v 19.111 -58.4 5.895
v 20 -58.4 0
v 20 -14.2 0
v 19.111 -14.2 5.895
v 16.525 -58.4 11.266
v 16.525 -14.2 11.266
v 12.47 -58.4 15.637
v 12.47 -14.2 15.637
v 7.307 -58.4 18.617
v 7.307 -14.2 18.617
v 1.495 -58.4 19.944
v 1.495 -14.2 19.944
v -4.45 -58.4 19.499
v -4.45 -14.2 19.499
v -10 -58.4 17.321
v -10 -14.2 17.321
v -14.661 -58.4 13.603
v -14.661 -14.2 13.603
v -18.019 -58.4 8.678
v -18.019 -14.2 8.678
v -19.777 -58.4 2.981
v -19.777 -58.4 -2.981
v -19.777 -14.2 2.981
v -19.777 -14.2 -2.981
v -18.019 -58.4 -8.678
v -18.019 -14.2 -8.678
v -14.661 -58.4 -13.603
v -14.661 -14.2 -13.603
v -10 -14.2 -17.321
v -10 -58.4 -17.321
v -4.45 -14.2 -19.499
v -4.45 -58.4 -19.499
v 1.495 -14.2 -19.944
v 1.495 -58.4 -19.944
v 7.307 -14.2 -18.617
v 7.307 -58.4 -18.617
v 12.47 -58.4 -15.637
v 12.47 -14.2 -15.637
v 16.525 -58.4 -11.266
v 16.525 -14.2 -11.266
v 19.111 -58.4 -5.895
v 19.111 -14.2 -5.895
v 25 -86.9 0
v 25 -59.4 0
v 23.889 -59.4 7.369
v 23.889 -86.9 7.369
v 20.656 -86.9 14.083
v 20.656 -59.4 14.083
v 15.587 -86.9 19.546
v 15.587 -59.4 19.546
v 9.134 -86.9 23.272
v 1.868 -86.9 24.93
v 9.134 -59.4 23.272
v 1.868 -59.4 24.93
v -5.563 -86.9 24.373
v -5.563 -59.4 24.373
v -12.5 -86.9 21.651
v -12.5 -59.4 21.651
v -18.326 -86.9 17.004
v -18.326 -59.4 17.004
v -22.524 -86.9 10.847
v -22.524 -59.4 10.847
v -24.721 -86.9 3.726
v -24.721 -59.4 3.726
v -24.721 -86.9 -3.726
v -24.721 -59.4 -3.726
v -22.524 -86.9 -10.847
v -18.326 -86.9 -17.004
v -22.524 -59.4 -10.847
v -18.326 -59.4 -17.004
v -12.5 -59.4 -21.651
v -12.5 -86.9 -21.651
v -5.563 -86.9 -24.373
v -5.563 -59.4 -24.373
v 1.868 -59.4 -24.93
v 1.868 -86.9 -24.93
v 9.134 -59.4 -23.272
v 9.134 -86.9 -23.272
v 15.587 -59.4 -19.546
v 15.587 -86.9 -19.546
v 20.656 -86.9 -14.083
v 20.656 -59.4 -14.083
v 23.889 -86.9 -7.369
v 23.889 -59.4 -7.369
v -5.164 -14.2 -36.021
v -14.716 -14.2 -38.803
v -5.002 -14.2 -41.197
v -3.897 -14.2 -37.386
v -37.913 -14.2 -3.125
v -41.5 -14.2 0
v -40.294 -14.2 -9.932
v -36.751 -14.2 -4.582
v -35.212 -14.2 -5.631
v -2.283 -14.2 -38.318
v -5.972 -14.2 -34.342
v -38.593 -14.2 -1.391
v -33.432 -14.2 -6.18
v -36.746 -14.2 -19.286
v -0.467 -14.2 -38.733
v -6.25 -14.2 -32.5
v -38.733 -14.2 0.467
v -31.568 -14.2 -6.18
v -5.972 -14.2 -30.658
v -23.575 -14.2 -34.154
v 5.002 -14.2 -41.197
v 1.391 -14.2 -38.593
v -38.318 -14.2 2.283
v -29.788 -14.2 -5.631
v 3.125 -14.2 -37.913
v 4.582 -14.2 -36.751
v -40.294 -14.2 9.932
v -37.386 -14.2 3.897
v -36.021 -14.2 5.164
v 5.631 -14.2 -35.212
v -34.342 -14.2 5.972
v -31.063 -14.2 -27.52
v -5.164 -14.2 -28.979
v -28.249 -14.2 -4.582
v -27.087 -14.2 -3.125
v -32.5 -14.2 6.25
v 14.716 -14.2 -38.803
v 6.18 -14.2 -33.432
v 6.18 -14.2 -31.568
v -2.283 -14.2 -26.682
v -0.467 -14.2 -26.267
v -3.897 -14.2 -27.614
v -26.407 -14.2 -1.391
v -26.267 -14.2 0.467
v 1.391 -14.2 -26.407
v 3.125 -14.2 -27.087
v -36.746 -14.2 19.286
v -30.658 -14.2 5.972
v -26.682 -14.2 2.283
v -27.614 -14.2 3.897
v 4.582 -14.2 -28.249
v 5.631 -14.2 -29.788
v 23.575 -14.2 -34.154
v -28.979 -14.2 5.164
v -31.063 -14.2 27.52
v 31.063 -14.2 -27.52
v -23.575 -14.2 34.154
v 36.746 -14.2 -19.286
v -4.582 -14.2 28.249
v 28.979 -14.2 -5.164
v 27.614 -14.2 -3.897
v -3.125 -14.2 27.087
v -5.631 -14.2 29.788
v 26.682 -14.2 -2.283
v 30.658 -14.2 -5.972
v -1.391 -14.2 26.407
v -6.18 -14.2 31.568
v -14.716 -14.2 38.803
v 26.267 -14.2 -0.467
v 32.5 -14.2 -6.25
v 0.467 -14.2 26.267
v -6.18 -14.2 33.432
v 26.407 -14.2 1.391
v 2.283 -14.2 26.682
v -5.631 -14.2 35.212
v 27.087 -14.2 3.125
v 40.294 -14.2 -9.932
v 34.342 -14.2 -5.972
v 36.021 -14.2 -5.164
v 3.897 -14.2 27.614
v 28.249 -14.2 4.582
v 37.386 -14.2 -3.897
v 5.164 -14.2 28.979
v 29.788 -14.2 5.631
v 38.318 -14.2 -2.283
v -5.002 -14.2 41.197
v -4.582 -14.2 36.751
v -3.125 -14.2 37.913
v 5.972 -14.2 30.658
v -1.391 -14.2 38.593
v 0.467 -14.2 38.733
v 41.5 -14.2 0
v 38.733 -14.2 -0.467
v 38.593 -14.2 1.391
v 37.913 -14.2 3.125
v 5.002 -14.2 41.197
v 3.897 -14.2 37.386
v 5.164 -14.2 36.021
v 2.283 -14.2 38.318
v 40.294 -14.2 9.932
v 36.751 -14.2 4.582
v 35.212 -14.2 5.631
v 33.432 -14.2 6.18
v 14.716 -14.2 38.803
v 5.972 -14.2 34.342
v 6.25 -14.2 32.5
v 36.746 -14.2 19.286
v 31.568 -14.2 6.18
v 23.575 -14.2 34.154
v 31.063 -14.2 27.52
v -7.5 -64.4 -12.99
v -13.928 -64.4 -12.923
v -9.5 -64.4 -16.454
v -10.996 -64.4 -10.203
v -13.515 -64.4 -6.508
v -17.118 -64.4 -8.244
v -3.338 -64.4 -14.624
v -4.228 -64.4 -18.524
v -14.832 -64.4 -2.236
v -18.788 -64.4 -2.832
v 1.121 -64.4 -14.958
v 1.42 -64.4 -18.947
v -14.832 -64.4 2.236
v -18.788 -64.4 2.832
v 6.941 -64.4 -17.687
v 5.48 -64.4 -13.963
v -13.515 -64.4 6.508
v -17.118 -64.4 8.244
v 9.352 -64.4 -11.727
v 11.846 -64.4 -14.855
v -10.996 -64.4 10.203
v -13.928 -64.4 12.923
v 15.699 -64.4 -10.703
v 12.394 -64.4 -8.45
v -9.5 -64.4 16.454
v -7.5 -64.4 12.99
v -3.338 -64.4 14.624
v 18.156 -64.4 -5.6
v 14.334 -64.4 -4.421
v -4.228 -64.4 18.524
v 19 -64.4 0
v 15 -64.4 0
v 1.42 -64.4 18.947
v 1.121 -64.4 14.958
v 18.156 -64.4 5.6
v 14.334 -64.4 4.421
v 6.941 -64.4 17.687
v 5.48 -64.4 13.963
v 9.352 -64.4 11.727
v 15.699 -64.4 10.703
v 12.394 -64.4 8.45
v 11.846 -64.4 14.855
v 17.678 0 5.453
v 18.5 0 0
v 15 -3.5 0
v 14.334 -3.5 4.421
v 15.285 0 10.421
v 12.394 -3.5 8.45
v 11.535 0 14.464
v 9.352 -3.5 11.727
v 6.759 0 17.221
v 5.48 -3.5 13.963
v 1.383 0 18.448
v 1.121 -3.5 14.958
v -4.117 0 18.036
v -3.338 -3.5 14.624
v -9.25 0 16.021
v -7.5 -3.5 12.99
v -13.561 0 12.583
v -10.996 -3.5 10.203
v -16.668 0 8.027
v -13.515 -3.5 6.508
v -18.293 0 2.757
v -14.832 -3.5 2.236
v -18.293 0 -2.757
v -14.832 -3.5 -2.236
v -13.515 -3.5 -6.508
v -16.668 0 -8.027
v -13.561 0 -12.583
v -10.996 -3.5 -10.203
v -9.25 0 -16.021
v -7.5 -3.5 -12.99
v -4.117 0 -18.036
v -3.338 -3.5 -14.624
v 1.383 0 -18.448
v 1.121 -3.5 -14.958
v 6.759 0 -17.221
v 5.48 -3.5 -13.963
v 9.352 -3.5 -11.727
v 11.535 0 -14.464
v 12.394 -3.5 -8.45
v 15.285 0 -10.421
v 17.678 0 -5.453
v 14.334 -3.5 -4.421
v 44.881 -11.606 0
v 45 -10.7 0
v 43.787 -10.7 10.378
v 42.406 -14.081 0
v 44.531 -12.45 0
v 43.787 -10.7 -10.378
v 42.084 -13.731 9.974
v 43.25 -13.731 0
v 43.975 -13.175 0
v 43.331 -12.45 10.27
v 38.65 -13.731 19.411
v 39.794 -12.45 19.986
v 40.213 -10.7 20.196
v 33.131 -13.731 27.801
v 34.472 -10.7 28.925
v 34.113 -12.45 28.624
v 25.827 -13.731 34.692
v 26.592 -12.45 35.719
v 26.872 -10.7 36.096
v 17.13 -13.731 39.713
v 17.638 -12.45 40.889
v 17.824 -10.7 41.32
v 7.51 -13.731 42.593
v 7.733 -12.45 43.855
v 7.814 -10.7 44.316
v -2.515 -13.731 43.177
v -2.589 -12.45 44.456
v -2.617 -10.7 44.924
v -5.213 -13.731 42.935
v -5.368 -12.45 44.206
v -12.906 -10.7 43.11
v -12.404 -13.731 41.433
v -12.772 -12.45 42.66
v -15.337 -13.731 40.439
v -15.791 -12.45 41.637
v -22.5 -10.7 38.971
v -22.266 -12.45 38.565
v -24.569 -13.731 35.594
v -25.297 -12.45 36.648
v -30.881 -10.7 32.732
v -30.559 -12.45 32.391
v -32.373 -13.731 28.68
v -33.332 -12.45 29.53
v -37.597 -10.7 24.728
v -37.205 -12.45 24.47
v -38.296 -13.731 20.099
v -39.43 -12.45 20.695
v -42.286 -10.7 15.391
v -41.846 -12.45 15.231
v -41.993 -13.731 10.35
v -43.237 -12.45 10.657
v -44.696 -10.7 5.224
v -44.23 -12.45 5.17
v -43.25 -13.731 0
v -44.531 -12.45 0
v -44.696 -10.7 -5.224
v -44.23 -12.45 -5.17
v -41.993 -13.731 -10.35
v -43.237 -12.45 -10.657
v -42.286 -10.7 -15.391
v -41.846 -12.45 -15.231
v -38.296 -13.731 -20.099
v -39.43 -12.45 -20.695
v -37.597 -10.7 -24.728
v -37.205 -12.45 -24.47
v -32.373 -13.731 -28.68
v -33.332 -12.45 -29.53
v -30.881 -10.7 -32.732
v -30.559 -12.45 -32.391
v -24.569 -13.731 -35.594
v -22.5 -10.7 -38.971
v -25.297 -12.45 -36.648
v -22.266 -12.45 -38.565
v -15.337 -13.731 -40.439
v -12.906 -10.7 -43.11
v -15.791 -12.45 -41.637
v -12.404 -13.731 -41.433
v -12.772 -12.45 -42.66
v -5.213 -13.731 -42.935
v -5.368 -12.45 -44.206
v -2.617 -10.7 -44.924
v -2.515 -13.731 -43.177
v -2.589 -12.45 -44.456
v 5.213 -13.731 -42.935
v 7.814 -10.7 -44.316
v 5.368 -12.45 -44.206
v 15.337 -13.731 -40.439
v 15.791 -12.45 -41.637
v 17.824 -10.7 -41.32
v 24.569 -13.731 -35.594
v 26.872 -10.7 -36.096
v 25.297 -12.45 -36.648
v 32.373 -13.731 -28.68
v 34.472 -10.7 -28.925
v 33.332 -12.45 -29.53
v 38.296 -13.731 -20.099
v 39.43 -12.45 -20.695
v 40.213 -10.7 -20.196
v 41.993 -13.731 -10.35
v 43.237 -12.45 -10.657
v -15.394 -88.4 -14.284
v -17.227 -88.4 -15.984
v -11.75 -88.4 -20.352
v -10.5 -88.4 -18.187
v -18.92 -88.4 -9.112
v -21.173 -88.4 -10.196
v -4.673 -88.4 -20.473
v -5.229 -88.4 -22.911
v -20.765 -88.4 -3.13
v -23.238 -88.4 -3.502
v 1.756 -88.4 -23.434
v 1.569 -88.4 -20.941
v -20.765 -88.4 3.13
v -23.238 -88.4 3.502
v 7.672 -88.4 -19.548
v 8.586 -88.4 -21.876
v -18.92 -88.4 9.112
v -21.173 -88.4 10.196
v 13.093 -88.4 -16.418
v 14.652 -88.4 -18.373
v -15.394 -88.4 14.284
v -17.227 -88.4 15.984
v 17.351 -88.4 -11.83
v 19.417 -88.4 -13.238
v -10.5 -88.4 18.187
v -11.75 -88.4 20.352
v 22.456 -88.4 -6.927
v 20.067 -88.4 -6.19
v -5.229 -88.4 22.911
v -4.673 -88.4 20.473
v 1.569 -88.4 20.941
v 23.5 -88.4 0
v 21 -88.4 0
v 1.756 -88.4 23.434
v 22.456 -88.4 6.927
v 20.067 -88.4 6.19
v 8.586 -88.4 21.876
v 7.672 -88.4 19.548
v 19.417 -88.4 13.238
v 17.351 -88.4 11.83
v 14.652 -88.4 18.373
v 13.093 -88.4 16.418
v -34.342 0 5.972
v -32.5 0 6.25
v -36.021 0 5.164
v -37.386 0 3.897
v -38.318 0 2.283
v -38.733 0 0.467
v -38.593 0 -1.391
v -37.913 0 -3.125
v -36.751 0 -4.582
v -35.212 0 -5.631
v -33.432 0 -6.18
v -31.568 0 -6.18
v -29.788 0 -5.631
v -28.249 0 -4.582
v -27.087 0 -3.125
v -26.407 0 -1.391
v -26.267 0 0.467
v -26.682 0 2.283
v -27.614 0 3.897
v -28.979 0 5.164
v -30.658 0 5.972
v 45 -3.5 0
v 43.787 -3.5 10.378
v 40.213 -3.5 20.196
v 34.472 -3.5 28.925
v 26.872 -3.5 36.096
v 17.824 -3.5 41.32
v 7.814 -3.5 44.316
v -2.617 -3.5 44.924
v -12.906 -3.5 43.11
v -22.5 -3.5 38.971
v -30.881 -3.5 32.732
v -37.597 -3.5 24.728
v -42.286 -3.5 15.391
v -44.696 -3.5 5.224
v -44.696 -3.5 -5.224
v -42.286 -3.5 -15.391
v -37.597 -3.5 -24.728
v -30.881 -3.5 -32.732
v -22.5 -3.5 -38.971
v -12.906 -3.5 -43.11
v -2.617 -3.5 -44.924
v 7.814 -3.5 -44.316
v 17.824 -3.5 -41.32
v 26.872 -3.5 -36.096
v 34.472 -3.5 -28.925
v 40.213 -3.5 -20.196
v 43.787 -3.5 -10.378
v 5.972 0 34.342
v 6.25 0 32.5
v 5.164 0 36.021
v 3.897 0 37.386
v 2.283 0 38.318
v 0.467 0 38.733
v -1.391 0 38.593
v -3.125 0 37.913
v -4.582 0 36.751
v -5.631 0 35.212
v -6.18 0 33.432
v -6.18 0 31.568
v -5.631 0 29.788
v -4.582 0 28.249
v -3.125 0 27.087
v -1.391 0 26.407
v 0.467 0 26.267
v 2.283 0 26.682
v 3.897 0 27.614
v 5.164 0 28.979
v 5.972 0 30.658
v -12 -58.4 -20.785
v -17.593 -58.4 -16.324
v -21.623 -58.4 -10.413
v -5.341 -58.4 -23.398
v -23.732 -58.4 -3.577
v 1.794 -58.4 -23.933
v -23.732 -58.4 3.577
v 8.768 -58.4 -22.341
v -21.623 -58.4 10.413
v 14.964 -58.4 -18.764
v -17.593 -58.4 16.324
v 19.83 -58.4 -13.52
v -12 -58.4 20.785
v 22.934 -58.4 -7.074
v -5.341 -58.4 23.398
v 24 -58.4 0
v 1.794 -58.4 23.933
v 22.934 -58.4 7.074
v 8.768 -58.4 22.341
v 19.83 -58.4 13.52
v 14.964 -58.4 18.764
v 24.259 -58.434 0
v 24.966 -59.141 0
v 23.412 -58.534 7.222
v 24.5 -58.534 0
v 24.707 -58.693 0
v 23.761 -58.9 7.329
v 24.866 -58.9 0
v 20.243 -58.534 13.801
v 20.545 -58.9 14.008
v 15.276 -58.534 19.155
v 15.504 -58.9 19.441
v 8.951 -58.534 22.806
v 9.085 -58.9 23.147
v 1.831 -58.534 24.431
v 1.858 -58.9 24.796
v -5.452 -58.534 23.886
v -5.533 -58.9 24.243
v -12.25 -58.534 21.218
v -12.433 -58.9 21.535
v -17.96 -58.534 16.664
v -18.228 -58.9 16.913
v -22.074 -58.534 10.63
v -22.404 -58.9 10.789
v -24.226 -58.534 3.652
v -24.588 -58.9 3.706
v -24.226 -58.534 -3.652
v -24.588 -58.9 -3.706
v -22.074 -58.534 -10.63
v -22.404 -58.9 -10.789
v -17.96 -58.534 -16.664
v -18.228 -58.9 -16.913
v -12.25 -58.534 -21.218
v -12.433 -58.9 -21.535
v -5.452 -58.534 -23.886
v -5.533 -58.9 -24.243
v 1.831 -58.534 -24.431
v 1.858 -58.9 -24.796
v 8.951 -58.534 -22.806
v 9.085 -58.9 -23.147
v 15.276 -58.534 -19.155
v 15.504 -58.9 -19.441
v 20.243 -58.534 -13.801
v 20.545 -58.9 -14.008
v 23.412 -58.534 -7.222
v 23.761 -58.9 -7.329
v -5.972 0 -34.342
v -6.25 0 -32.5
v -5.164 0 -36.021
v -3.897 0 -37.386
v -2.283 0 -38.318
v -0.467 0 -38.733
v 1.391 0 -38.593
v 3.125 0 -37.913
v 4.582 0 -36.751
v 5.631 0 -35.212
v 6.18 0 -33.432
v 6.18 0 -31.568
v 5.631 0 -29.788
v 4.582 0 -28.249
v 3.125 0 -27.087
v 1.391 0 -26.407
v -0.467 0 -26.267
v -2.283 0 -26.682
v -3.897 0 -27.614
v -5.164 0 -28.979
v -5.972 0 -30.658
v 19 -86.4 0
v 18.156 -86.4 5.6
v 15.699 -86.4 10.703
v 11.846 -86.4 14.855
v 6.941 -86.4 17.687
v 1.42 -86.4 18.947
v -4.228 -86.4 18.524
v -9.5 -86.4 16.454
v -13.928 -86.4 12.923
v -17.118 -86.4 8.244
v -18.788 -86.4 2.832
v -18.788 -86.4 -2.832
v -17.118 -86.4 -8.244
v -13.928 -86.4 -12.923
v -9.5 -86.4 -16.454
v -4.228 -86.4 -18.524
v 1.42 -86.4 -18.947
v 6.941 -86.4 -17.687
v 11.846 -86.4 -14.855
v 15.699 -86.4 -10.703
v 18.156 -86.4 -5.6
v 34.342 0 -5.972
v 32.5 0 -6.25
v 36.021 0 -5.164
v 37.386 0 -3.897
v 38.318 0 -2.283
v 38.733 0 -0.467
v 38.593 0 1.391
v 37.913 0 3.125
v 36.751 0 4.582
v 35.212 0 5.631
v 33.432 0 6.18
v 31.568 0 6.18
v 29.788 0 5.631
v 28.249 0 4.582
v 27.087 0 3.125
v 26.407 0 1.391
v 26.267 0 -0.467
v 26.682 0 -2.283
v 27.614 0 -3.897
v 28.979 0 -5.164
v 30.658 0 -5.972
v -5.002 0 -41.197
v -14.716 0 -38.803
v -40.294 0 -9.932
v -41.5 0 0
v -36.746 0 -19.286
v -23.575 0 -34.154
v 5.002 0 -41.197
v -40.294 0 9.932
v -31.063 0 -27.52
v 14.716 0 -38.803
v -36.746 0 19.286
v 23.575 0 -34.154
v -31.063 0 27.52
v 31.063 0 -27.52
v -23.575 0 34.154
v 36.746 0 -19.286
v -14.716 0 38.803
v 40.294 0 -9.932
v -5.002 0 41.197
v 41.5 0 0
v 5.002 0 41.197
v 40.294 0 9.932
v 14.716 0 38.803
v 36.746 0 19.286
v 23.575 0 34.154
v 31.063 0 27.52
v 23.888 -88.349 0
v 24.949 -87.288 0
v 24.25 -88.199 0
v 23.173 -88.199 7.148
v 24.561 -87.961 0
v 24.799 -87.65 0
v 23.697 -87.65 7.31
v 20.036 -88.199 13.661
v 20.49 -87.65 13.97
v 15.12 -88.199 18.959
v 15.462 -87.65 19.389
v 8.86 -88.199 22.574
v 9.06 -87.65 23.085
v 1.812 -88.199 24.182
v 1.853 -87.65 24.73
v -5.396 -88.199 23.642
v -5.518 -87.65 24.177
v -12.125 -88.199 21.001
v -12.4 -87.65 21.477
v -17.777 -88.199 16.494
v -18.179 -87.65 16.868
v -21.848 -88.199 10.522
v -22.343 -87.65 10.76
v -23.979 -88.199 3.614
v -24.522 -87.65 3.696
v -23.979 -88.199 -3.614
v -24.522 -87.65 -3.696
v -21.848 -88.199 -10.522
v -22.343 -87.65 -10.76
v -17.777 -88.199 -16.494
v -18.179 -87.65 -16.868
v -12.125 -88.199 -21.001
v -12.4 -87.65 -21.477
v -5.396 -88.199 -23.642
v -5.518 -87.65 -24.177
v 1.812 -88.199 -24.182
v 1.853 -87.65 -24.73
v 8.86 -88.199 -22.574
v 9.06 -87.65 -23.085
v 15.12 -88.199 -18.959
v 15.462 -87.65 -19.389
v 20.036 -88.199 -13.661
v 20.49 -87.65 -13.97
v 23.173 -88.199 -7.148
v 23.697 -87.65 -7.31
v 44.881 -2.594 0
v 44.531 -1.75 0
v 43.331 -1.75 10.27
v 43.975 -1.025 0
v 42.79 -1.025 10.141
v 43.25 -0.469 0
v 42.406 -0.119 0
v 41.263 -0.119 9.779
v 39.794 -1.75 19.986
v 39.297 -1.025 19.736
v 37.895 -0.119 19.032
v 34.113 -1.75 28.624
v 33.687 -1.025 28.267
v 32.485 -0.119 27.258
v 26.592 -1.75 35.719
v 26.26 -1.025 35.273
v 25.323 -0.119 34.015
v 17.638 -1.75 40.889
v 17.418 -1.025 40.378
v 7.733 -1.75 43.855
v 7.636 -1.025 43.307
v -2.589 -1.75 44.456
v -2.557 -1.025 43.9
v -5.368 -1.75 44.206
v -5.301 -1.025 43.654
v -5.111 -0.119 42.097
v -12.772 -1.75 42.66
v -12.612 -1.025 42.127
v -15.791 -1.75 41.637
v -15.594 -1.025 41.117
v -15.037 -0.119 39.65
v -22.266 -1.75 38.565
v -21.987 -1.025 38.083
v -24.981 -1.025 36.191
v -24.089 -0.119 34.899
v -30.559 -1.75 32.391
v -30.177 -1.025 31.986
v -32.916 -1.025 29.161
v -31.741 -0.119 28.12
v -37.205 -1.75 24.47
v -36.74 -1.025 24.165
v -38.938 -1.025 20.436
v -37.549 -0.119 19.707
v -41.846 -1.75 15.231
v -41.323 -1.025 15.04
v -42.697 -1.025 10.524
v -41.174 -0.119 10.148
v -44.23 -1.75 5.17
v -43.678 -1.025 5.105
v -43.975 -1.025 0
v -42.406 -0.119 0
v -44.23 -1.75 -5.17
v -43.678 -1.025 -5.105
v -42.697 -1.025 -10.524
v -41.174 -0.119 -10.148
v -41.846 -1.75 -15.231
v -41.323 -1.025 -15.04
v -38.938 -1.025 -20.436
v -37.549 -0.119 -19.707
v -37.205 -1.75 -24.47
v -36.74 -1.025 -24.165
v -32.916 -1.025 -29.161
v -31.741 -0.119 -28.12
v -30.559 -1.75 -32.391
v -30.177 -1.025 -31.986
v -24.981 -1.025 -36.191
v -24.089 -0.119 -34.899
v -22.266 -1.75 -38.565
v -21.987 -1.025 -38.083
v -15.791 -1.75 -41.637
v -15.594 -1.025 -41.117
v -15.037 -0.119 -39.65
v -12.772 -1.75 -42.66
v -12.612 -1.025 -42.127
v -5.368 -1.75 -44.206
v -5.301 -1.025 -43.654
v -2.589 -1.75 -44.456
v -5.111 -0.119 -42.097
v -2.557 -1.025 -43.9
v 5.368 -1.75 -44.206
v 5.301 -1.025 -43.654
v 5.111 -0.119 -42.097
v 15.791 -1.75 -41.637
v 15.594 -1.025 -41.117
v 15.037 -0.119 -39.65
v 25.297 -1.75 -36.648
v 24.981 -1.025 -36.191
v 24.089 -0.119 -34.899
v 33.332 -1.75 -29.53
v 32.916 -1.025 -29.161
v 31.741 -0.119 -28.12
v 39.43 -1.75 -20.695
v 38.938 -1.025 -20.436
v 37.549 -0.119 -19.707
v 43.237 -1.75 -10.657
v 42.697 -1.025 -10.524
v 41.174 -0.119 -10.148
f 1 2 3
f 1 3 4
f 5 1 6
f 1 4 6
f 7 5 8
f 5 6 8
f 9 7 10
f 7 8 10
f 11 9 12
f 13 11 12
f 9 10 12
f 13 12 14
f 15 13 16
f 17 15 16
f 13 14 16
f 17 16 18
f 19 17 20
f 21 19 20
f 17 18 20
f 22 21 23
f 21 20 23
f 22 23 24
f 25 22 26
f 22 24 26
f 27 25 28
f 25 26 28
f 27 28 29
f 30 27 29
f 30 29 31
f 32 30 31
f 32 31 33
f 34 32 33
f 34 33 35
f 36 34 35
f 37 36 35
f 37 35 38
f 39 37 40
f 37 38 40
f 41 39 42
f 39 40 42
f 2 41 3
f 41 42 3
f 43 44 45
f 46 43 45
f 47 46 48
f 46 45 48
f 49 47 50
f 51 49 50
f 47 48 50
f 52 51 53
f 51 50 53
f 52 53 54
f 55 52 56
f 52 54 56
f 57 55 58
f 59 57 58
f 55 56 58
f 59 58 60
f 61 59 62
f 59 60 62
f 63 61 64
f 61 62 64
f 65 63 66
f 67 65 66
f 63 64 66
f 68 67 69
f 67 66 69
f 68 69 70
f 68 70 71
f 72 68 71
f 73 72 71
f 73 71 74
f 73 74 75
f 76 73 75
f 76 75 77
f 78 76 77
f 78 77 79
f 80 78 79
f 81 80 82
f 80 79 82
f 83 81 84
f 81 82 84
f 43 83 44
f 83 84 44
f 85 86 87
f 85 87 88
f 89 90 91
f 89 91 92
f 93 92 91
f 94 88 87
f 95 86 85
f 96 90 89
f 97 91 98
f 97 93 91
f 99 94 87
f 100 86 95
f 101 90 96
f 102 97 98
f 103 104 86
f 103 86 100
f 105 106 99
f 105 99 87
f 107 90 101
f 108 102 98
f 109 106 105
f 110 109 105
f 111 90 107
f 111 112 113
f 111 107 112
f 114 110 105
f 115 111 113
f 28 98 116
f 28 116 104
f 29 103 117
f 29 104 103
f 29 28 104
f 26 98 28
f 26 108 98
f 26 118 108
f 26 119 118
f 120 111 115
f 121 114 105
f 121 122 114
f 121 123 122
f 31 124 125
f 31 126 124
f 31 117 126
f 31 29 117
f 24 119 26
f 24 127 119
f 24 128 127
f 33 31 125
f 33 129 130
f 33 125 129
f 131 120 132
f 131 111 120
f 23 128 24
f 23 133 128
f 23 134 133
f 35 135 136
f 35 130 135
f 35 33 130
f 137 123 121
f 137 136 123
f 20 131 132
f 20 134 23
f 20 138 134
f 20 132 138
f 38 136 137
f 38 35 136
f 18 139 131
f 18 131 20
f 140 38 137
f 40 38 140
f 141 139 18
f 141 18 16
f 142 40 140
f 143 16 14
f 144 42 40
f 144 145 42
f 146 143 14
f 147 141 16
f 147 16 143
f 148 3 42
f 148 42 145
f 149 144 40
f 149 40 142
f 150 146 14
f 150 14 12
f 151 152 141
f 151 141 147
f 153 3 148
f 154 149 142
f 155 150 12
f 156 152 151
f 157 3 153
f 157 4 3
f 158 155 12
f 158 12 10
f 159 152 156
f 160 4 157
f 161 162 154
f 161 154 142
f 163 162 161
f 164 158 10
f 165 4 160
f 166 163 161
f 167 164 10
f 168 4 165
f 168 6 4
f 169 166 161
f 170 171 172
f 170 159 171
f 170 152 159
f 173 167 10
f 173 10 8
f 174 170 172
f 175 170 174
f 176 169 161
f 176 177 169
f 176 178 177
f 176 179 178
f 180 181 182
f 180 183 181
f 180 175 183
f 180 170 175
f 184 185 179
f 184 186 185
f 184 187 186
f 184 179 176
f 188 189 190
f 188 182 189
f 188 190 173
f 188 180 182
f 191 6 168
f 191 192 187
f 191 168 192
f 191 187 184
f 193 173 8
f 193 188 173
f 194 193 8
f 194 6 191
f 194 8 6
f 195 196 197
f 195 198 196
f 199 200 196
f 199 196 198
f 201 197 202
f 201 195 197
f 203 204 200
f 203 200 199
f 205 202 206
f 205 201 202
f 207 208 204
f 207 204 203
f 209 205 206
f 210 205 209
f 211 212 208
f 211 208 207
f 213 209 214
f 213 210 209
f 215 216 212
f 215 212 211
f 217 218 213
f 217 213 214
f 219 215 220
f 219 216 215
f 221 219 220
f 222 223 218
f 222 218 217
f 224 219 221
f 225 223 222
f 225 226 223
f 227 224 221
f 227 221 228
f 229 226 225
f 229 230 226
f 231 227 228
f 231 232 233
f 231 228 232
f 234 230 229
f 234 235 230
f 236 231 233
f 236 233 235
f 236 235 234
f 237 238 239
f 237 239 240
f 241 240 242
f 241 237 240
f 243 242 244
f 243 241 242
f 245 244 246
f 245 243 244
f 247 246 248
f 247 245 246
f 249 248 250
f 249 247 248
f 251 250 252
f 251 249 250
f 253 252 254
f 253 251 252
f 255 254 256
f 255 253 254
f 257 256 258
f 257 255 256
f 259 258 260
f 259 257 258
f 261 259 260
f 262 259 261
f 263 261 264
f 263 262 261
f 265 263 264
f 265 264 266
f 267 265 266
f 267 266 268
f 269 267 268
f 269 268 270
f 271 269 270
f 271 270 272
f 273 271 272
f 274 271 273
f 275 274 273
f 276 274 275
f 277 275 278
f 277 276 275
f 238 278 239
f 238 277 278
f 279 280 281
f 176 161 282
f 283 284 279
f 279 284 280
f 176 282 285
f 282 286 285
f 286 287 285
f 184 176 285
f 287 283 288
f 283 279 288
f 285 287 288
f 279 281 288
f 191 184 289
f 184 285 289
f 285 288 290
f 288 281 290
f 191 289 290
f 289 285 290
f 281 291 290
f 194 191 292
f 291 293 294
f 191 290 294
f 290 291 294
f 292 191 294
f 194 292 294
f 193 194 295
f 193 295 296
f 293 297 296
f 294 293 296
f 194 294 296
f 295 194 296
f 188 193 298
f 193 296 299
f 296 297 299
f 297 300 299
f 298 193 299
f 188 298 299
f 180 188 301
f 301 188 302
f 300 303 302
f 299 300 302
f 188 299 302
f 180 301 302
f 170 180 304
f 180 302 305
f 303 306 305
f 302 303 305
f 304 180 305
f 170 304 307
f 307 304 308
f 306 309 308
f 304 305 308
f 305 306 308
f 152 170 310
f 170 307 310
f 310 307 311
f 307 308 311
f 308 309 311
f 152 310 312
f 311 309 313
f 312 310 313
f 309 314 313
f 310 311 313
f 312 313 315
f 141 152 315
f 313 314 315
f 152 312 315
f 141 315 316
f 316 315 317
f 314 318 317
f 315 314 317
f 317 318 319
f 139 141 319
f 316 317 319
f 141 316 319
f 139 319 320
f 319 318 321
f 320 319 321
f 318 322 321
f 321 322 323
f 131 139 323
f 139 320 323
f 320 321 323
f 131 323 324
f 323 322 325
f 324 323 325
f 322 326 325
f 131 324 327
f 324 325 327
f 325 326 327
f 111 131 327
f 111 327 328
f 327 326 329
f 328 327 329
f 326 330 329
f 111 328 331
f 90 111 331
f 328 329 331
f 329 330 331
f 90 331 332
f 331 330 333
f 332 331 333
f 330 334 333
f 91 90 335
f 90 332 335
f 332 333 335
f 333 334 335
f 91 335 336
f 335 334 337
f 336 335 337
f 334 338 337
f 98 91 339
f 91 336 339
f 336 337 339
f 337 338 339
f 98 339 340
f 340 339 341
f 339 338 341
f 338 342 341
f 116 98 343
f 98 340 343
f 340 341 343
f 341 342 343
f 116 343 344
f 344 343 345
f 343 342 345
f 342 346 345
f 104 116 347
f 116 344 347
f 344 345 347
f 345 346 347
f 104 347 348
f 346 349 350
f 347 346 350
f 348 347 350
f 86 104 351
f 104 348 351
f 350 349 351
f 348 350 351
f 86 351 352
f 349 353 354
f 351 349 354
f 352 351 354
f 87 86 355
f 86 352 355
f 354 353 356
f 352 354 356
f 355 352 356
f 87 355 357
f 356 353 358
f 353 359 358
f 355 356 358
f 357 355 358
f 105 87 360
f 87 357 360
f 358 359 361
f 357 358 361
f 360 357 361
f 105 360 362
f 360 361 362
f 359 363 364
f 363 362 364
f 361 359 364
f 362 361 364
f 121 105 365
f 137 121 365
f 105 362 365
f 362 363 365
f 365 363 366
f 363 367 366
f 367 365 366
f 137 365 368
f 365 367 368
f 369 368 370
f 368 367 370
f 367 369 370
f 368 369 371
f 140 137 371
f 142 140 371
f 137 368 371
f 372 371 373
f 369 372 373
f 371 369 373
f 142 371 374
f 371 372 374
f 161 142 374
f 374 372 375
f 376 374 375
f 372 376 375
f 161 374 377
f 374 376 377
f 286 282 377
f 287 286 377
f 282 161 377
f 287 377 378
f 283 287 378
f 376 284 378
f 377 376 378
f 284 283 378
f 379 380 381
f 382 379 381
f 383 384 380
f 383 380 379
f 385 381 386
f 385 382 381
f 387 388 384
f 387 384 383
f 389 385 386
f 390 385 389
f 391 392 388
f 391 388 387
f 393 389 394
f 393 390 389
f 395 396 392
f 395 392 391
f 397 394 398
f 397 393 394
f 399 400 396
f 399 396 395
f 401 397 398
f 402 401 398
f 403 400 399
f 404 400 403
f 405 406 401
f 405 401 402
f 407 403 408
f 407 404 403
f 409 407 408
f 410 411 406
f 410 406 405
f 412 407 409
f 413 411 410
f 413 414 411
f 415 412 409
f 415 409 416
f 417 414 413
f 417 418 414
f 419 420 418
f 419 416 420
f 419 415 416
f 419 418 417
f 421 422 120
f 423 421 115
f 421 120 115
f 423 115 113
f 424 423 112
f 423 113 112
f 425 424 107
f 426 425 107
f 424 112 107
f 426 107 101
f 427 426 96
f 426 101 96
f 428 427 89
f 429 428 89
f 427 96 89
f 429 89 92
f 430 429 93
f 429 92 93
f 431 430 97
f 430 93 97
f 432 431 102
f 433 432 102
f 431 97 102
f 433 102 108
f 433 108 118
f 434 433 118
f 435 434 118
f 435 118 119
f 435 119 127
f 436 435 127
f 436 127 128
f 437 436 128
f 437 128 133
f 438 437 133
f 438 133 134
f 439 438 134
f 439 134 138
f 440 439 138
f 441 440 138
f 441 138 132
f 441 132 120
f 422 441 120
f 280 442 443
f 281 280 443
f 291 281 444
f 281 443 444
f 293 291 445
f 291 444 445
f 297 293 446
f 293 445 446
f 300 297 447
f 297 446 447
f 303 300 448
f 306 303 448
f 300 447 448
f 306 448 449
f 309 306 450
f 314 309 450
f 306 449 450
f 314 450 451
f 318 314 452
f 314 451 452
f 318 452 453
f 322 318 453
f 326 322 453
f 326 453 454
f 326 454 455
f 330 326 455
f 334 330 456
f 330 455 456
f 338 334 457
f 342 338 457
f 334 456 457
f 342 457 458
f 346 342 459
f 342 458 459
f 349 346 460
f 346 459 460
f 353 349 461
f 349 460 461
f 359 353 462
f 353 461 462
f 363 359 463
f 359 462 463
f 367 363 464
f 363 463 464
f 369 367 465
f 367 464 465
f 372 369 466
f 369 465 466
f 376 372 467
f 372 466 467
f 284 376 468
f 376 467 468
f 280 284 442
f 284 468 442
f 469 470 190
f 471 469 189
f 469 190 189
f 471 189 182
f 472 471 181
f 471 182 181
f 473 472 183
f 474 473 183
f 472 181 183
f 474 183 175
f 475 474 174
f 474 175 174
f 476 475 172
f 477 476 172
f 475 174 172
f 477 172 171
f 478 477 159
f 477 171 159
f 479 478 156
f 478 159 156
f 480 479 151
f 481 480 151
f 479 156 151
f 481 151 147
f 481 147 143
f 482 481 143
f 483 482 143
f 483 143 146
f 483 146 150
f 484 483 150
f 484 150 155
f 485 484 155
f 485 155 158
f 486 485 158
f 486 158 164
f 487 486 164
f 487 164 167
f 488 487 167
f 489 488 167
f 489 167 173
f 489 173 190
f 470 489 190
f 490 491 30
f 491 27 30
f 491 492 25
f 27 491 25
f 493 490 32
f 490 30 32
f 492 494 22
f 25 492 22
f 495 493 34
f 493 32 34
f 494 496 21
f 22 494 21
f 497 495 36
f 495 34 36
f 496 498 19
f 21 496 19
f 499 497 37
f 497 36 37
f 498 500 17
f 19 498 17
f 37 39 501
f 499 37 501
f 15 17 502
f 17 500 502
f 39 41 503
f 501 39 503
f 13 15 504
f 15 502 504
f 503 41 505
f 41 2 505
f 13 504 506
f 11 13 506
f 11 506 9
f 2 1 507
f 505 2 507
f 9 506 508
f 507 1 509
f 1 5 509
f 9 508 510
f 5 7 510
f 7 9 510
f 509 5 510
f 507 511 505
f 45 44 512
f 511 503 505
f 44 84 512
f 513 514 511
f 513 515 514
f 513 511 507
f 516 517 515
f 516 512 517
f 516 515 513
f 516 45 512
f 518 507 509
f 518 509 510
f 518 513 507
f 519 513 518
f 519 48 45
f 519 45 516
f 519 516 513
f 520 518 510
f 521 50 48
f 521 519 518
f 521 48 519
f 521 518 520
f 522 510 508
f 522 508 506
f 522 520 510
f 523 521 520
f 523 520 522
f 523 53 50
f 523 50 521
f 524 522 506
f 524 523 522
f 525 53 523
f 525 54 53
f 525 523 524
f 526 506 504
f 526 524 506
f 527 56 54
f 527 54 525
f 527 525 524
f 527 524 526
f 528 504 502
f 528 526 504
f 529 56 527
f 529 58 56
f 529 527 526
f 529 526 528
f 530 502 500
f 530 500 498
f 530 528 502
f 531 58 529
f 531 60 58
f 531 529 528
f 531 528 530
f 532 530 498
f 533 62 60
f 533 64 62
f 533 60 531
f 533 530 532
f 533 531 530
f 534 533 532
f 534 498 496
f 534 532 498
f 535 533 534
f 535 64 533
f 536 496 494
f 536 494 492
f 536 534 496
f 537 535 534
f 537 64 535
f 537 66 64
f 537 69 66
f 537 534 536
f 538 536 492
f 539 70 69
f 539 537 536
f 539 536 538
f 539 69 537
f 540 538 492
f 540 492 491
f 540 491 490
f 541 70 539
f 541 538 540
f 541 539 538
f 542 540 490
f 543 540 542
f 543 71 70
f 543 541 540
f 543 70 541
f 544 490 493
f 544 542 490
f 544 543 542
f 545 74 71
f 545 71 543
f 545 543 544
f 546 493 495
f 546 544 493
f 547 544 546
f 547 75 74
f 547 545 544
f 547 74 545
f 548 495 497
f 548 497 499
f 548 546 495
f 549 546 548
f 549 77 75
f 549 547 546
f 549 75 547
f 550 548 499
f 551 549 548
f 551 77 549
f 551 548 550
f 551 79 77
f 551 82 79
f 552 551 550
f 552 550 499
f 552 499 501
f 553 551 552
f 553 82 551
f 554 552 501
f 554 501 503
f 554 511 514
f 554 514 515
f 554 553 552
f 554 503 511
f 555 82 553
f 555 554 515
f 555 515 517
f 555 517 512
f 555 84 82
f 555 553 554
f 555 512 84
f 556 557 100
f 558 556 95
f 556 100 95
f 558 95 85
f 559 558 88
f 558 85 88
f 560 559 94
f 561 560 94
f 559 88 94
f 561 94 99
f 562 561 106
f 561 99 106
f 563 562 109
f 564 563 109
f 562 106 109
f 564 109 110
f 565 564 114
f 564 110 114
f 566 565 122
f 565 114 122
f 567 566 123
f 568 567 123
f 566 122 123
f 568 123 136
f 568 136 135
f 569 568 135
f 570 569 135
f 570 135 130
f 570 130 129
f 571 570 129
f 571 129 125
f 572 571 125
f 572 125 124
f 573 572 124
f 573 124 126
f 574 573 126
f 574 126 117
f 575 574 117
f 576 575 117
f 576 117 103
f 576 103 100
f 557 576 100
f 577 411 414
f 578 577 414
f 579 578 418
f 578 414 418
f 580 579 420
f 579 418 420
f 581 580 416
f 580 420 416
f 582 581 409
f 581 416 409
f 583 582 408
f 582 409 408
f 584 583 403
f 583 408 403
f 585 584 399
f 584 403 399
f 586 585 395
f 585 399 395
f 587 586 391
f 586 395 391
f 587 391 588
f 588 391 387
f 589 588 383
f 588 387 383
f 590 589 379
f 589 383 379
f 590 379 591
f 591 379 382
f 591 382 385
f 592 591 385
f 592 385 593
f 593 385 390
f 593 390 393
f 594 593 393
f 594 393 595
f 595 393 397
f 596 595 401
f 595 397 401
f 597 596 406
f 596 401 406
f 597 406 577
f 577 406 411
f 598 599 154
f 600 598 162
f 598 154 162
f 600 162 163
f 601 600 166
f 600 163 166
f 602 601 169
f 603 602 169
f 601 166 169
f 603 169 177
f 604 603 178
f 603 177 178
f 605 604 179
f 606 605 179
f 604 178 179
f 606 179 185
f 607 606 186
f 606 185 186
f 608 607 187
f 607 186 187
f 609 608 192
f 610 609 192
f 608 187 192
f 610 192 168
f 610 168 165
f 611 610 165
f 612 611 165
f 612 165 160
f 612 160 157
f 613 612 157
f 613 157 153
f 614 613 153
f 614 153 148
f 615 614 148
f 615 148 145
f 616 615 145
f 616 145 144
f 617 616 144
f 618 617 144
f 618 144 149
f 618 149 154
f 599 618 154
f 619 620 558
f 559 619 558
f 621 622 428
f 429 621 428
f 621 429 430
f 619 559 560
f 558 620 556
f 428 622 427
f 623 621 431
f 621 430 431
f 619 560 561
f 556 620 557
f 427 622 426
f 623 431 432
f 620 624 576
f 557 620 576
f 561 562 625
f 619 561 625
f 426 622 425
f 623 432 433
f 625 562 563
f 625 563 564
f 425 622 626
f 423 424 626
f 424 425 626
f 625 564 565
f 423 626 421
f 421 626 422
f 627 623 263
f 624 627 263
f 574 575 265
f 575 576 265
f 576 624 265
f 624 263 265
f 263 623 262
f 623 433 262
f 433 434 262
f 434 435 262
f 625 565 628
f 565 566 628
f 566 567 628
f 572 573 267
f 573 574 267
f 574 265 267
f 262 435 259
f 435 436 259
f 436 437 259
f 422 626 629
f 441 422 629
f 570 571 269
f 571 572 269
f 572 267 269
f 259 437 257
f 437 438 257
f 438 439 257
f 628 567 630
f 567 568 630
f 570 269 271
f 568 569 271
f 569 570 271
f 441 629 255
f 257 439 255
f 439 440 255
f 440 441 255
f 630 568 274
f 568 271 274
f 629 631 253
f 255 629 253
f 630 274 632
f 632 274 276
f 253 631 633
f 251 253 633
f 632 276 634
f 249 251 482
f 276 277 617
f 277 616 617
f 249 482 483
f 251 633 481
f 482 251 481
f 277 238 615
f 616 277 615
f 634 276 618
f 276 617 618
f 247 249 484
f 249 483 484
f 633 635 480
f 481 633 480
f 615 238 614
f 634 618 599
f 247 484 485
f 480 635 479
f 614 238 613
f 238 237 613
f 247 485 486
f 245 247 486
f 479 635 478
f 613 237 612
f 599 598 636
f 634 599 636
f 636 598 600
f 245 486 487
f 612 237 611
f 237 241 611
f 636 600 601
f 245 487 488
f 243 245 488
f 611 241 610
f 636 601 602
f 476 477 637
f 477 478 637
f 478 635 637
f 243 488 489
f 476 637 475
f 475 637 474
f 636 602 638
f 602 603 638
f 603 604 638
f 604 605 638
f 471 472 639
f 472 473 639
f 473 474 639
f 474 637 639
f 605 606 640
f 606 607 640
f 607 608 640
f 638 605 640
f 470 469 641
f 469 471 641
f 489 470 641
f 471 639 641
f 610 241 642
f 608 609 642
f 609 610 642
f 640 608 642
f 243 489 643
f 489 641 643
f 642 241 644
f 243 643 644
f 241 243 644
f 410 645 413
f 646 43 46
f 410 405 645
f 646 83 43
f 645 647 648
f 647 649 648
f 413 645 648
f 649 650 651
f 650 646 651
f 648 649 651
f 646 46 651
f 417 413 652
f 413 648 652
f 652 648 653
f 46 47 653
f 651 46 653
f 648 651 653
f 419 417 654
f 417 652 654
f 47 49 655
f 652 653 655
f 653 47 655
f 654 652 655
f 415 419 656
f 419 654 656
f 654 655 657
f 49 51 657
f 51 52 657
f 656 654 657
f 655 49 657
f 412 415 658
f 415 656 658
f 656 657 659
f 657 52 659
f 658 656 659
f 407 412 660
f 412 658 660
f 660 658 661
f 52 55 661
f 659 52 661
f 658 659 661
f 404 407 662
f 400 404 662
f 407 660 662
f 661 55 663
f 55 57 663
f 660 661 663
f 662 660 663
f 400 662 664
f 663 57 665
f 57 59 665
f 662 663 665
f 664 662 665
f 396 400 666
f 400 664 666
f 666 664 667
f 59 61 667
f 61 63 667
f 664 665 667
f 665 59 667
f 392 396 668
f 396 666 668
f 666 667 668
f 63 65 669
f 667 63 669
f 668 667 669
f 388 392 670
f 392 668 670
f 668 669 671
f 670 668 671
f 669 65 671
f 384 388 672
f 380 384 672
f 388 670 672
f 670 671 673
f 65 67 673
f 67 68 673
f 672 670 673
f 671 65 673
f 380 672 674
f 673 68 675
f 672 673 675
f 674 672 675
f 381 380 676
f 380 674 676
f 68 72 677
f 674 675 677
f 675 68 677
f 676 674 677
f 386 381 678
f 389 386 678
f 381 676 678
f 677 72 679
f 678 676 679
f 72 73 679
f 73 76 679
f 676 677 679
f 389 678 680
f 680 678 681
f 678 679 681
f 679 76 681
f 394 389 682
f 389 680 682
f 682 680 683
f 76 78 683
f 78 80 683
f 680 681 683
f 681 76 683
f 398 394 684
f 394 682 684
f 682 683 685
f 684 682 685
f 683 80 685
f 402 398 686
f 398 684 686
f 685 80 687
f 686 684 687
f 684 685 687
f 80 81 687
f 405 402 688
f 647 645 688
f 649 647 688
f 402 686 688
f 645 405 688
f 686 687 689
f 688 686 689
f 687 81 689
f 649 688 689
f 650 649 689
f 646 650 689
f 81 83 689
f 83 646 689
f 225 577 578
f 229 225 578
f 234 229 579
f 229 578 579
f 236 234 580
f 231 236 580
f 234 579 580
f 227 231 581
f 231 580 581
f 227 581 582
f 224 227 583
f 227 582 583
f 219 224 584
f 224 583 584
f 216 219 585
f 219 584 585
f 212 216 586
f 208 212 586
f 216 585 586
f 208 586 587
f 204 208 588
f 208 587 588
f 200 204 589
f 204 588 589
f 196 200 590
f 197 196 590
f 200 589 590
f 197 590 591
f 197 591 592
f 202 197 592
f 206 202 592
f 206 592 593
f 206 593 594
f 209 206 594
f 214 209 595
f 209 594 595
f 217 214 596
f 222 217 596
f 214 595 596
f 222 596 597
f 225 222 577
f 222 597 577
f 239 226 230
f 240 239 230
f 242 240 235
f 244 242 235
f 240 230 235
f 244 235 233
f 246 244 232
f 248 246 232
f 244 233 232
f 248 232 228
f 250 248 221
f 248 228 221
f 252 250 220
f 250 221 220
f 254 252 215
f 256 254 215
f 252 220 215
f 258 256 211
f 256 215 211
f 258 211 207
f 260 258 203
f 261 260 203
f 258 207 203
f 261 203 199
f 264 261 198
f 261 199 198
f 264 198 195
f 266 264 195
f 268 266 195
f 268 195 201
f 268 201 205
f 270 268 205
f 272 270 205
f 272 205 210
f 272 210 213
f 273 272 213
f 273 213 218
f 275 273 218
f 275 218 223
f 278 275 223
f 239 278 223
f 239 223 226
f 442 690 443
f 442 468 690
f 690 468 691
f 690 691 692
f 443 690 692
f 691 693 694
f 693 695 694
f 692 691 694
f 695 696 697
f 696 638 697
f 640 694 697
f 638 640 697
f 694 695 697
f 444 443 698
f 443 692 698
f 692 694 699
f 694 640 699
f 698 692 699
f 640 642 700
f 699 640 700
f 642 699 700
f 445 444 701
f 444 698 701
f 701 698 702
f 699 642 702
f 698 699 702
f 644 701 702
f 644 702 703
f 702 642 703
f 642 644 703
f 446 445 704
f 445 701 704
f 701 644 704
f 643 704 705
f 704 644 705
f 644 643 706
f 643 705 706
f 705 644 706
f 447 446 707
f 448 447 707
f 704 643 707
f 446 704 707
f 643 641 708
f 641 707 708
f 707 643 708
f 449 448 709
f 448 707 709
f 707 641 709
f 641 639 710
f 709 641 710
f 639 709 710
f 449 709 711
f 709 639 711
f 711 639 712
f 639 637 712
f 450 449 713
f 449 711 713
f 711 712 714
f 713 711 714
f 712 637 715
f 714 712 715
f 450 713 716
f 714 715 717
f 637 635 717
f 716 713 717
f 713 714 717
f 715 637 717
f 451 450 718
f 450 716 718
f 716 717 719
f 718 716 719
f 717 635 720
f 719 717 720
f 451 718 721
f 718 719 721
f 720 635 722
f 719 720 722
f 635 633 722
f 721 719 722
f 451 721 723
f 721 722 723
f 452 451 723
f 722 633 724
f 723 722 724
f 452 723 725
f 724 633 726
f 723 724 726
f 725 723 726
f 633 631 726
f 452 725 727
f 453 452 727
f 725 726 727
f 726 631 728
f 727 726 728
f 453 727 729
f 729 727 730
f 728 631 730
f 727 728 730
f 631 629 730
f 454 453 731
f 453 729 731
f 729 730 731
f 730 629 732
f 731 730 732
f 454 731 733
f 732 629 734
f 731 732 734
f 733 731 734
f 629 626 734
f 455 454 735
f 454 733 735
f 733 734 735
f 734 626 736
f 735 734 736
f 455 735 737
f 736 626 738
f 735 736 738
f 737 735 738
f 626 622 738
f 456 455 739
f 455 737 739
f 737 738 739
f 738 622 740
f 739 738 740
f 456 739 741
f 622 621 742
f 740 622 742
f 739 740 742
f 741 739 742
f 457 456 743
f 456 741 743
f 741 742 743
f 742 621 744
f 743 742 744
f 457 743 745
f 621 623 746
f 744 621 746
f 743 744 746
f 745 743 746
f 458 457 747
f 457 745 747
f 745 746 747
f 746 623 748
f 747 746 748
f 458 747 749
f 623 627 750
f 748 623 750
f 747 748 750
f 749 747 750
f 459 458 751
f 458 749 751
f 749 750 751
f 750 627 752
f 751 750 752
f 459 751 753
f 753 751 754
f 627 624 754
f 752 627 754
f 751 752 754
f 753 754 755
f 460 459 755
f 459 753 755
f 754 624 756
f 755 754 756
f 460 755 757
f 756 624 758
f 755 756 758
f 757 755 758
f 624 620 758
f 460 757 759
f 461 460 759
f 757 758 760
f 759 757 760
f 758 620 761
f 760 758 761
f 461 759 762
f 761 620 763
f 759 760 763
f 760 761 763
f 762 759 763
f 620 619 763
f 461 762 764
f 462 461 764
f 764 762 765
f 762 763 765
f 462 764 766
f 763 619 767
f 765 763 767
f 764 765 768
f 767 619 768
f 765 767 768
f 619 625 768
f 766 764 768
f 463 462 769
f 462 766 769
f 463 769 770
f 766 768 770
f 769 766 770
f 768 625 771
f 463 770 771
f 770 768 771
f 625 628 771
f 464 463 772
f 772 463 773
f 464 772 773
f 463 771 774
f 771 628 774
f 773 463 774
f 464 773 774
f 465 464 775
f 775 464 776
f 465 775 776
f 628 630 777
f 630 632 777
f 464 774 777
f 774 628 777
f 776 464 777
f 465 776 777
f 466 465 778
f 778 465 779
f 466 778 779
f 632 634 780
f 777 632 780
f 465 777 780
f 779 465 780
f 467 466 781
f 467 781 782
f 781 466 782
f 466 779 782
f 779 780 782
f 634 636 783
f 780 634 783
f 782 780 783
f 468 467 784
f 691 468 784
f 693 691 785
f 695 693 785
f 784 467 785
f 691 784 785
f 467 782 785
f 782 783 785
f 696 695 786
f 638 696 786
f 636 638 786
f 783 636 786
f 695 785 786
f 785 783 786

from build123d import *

# Parameters (mm, degrees)
SKETCH_R           = 45
PAD_DEPTH          = 14.2
SKETCH001_R        = 20
PAD001_DEPTH       = 44.2
SKETCH002_R        = 25
PAD002_DEPTH       = 30
SKETCH003_R        = 19
POCKET_DEPTH       = 24
SKETCH004_R        = 15
POCKET001_DEPTH    = 64.401
CHAMFER_SIZE       = 3.5
CHAMFER001_SIZE    = 2
FILLET_R           = 1.5
SKETCH005_R        = 6.25
POCKET002_DEPTH    = 324.133638
POLARPATTERN_COUNT = 4
FILLET001_R        = 3.5
FILLET002_R        = 1


with BuildPart() as part:
    # Sketch → Pad (new body)
    with BuildSketch(Plane.XZ):
        Circle(SKETCH_R)
    extrude(amount=PAD_DEPTH)

    # Sketch001 (on Face3 of Pad) → Pad001 (join)
    with BuildSketch(Plane.XZ.offset(14.2)):
        Circle(SKETCH001_R)
    extrude(amount=PAD001_DEPTH)

    # Sketch002 (on Face5 of Pad001) → Pad002 (join)
    with BuildSketch(Plane.XZ.offset(58.4)):
        Circle(SKETCH002_R)
    extrude(amount=PAD002_DEPTH)

    # Sketch003 (on Face3 of Pad002) → Pocket (cut)
    with BuildSketch(Plane.XZ.offset(88.4)):
        Circle(SKETCH003_R)
    extrude(amount=-POCKET_DEPTH, mode=Mode.SUBTRACT)

    # Sketch004 (on Face7 of Pocket) → Pocket001 (cut, through all)
    with BuildSketch(Plane.XZ.offset(64.4)):
        Circle(SKETCH004_R)
    extrude(amount=-POCKET001_DEPTH, mode=Mode.SUBTRACT)

    # Chamfer
    chamfer_edges = [part.edges().sort_by_distance(p)[0] for p in [
        (-15, 0, 0),
    ]]
    chamfer(chamfer_edges, length=CHAMFER_SIZE)

    # Chamfer001
    chamfer001_edges = [part.edges().sort_by_distance(p)[0] for p in [
        (-19, -88.4, 0),
    ]]
    chamfer(chamfer001_edges, length=CHAMFER001_SIZE)

    # Fillet
    fillet_edges = [part.edges().sort_by_distance(p)[0] for p in [
        (-25, -88.4, 0),
    ]]
    fillet(fillet_edges, radius=FILLET_R)

    # Sketch005 (on Face10 of Fillet) → Pocket002 (cut, through all)
    with BuildSketch(Plane.XZ.offset(14.2)):
        with Locations((0, 32.5)):
            Circle(SKETCH005_R)
    pocket002 = extrude(amount=-POCKET002_DEPTH, mode=Mode.SUBTRACT)

    # PolarPattern: Pocket002 ×4 about axis
    polarpattern_axis = Axis((0, -14.2, 0), (0, -1, 0))
    for i in range(1, POLARPATTERN_COUNT):
        add(pocket002.rotate(polarpattern_axis, i * 360 / POLARPATTERN_COUNT), mode=Mode.SUBTRACT)

    # Fillet001
    fillet001_edges = [part.edges().sort_by_distance(p)[0] for p in [
        (45, -7.1, 0),
        (-45, 0, 0),
        (-45, -14.2, 0),
    ]]
    fillet(fillet001_edges, radius=FILLET001_R)

    # Fillet002
    fillet002_edges = [part.edges().sort_by_distance(p)[0] for p in [
        (-25, -58.4, 0),
    ]]
    fillet(fillet002_edges, radius=FILLET002_R)


solid = part.part
